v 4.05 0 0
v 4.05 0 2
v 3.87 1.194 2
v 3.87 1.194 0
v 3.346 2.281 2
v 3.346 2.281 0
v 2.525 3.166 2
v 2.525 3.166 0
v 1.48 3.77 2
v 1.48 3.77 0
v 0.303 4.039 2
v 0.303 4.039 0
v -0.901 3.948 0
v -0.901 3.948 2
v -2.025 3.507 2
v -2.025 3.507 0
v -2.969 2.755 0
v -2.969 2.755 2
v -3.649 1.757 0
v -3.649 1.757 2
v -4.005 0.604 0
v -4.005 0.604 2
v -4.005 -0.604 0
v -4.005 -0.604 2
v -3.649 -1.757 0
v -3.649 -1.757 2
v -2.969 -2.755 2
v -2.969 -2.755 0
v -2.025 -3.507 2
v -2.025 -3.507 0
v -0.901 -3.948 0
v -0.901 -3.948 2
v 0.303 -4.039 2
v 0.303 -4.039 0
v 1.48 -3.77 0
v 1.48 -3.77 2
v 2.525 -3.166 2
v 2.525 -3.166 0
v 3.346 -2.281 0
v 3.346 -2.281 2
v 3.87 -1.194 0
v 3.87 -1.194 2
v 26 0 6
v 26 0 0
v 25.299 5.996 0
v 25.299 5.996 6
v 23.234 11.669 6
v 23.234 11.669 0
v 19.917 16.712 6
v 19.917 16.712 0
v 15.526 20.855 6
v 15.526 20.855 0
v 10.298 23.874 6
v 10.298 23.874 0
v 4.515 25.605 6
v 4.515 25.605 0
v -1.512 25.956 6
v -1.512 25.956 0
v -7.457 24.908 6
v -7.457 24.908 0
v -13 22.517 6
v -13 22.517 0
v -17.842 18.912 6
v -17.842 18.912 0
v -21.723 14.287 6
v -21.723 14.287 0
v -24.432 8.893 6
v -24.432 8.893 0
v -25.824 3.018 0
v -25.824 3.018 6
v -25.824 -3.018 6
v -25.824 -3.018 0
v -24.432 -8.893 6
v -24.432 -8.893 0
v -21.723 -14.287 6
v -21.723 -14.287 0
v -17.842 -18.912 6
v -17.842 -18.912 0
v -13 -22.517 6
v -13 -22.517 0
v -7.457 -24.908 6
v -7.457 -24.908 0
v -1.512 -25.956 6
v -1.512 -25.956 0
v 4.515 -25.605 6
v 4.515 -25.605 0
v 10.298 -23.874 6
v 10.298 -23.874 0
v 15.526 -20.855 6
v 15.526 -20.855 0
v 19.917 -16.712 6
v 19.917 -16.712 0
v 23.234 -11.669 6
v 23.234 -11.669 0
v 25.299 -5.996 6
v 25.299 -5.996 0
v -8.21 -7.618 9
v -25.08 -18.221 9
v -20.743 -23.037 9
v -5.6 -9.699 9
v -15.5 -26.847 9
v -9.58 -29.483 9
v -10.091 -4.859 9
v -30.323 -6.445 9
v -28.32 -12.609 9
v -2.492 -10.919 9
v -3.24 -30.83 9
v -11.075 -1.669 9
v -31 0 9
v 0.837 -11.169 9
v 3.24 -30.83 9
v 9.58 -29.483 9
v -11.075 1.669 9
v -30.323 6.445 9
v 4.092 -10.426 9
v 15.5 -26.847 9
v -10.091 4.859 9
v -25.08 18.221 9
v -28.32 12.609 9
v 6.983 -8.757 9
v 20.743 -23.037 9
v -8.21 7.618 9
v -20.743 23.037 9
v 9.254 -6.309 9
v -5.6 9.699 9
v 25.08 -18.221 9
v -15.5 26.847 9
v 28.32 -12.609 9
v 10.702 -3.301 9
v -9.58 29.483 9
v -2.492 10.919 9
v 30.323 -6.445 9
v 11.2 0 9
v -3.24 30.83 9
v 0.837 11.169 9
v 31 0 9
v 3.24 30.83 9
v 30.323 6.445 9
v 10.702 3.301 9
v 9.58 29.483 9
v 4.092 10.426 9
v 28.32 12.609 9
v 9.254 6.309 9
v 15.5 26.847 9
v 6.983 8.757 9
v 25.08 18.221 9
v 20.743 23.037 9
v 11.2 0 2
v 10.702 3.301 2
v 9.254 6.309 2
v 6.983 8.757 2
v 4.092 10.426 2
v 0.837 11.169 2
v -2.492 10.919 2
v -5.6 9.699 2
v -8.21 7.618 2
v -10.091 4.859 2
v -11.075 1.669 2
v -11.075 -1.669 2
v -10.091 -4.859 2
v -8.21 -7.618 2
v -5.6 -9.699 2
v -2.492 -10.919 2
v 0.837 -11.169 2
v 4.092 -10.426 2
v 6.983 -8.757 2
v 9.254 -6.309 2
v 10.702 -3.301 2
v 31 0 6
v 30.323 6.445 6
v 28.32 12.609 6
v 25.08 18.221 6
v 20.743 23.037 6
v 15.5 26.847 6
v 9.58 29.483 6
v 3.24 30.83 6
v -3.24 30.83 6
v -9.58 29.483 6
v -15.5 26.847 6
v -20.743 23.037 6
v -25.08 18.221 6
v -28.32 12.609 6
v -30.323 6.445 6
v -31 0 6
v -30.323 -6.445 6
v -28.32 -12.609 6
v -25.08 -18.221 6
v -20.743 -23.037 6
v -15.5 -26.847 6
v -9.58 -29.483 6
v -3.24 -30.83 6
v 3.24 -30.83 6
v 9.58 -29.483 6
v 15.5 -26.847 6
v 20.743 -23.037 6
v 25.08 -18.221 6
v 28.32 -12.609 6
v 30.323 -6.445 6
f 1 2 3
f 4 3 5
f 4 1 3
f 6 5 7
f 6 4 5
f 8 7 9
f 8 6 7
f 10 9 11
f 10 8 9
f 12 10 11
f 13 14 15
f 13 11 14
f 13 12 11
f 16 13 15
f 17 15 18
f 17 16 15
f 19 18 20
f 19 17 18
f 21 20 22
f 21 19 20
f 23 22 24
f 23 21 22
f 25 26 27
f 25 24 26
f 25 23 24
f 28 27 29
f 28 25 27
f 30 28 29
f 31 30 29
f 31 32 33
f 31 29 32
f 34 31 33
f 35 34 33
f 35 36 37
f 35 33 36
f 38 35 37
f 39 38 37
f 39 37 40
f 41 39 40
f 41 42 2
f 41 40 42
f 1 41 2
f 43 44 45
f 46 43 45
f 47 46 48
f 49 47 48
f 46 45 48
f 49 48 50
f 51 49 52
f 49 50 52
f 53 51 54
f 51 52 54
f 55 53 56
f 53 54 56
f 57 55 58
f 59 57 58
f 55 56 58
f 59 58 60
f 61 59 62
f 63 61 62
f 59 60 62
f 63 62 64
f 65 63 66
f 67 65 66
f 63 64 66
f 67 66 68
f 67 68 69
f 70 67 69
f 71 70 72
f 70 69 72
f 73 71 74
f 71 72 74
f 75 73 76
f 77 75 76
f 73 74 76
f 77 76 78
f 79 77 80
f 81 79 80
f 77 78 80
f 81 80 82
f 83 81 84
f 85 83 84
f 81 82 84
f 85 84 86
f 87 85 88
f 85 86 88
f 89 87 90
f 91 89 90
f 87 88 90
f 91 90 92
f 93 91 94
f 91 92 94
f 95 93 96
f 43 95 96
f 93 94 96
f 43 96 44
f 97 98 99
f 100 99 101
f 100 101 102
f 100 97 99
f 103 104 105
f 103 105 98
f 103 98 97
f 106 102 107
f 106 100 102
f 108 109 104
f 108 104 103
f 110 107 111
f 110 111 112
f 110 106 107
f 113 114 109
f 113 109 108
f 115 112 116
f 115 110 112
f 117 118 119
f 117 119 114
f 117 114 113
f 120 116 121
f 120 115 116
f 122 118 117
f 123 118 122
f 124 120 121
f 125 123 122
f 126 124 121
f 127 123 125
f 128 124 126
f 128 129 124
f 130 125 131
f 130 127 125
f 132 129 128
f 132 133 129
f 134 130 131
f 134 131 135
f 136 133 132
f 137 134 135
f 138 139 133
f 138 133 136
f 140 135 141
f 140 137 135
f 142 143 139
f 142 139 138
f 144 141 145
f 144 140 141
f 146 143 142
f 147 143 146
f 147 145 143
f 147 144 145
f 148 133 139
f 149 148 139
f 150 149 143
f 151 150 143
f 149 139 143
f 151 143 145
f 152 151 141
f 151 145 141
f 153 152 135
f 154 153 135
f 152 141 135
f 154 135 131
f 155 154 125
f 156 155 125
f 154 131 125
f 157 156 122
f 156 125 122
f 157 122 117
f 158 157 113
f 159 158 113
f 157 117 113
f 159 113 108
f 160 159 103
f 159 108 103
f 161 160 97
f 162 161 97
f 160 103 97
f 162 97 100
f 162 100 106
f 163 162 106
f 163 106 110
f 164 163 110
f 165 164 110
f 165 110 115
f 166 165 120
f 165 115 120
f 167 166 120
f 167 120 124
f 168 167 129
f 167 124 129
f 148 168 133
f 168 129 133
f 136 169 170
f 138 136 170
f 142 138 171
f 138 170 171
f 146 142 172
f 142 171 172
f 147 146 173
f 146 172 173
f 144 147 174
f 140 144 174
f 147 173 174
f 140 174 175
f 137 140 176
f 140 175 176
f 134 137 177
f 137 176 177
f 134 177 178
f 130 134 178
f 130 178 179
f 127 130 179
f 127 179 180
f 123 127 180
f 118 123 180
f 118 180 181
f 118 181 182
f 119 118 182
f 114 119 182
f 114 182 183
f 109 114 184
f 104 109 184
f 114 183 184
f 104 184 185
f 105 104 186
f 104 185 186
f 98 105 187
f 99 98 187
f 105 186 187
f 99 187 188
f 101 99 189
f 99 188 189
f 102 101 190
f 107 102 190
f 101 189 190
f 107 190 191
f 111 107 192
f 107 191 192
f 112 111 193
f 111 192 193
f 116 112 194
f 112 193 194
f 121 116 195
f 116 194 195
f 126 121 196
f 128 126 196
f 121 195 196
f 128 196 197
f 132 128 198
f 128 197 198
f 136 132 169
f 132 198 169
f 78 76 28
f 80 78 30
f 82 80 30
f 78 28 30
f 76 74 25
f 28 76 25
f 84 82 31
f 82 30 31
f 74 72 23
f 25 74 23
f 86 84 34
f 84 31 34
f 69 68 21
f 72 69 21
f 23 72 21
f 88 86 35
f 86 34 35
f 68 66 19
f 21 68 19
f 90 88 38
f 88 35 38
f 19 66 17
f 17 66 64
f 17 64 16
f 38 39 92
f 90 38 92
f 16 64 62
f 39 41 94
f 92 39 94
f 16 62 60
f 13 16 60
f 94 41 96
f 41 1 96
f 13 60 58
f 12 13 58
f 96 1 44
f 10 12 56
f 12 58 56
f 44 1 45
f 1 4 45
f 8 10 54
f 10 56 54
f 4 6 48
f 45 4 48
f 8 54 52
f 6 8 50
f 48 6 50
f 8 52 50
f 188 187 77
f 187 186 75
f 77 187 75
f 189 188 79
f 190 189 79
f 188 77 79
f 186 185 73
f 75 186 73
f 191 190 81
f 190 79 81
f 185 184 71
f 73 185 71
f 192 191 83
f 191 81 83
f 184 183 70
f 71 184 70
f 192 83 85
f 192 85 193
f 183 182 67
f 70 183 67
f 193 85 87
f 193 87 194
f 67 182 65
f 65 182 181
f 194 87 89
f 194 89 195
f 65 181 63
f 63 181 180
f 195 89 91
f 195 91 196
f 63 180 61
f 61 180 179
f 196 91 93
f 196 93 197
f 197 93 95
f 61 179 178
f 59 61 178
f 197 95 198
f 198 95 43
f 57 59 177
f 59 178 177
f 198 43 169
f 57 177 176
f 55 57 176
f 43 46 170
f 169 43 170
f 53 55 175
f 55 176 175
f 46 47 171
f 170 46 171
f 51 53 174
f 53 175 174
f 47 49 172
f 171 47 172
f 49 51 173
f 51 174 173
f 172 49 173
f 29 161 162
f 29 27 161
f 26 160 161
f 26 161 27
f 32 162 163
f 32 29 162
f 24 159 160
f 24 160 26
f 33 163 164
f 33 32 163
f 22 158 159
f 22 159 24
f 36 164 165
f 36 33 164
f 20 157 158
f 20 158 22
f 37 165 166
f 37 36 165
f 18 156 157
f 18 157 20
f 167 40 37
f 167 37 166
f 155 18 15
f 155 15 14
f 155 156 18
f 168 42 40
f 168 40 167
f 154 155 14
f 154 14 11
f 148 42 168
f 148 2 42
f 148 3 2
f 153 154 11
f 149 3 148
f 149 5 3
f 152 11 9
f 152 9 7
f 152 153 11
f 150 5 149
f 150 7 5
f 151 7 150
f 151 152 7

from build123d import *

# Parameters (mm, degrees)
SKETCH_R     = 26
SKETCH_R_2   = 4.05
PAD_DEPTH    = 6
SKETCH001_R  = 31
PAD001_DEPTH = 3
SKETCH002_R  = 11.2
POCKET_DEPTH = 7


with BuildPart() as part:
    # Sketch → Pad (new body)
    with BuildSketch(Plane.XY):
        Circle(SKETCH_R)
        Circle(SKETCH_R_2, mode=Mode.SUBTRACT)
    extrude(amount=PAD_DEPTH)

    # Sketch001 (on Face4 of Pad) → Pad001 (join)
    with BuildSketch(Plane.XY.offset(6)):
        Circle(SKETCH001_R)
    extrude(amount=PAD001_DEPTH)

    # Sketch002 (on Face3 of Pad001) → Pocket (cut)
    with BuildSketch(Plane.XY.offset(9)):
        Circle(SKETCH002_R)
    extrude(amount=-POCKET_DEPTH, mode=Mode.SUBTRACT)


solid = part.part
